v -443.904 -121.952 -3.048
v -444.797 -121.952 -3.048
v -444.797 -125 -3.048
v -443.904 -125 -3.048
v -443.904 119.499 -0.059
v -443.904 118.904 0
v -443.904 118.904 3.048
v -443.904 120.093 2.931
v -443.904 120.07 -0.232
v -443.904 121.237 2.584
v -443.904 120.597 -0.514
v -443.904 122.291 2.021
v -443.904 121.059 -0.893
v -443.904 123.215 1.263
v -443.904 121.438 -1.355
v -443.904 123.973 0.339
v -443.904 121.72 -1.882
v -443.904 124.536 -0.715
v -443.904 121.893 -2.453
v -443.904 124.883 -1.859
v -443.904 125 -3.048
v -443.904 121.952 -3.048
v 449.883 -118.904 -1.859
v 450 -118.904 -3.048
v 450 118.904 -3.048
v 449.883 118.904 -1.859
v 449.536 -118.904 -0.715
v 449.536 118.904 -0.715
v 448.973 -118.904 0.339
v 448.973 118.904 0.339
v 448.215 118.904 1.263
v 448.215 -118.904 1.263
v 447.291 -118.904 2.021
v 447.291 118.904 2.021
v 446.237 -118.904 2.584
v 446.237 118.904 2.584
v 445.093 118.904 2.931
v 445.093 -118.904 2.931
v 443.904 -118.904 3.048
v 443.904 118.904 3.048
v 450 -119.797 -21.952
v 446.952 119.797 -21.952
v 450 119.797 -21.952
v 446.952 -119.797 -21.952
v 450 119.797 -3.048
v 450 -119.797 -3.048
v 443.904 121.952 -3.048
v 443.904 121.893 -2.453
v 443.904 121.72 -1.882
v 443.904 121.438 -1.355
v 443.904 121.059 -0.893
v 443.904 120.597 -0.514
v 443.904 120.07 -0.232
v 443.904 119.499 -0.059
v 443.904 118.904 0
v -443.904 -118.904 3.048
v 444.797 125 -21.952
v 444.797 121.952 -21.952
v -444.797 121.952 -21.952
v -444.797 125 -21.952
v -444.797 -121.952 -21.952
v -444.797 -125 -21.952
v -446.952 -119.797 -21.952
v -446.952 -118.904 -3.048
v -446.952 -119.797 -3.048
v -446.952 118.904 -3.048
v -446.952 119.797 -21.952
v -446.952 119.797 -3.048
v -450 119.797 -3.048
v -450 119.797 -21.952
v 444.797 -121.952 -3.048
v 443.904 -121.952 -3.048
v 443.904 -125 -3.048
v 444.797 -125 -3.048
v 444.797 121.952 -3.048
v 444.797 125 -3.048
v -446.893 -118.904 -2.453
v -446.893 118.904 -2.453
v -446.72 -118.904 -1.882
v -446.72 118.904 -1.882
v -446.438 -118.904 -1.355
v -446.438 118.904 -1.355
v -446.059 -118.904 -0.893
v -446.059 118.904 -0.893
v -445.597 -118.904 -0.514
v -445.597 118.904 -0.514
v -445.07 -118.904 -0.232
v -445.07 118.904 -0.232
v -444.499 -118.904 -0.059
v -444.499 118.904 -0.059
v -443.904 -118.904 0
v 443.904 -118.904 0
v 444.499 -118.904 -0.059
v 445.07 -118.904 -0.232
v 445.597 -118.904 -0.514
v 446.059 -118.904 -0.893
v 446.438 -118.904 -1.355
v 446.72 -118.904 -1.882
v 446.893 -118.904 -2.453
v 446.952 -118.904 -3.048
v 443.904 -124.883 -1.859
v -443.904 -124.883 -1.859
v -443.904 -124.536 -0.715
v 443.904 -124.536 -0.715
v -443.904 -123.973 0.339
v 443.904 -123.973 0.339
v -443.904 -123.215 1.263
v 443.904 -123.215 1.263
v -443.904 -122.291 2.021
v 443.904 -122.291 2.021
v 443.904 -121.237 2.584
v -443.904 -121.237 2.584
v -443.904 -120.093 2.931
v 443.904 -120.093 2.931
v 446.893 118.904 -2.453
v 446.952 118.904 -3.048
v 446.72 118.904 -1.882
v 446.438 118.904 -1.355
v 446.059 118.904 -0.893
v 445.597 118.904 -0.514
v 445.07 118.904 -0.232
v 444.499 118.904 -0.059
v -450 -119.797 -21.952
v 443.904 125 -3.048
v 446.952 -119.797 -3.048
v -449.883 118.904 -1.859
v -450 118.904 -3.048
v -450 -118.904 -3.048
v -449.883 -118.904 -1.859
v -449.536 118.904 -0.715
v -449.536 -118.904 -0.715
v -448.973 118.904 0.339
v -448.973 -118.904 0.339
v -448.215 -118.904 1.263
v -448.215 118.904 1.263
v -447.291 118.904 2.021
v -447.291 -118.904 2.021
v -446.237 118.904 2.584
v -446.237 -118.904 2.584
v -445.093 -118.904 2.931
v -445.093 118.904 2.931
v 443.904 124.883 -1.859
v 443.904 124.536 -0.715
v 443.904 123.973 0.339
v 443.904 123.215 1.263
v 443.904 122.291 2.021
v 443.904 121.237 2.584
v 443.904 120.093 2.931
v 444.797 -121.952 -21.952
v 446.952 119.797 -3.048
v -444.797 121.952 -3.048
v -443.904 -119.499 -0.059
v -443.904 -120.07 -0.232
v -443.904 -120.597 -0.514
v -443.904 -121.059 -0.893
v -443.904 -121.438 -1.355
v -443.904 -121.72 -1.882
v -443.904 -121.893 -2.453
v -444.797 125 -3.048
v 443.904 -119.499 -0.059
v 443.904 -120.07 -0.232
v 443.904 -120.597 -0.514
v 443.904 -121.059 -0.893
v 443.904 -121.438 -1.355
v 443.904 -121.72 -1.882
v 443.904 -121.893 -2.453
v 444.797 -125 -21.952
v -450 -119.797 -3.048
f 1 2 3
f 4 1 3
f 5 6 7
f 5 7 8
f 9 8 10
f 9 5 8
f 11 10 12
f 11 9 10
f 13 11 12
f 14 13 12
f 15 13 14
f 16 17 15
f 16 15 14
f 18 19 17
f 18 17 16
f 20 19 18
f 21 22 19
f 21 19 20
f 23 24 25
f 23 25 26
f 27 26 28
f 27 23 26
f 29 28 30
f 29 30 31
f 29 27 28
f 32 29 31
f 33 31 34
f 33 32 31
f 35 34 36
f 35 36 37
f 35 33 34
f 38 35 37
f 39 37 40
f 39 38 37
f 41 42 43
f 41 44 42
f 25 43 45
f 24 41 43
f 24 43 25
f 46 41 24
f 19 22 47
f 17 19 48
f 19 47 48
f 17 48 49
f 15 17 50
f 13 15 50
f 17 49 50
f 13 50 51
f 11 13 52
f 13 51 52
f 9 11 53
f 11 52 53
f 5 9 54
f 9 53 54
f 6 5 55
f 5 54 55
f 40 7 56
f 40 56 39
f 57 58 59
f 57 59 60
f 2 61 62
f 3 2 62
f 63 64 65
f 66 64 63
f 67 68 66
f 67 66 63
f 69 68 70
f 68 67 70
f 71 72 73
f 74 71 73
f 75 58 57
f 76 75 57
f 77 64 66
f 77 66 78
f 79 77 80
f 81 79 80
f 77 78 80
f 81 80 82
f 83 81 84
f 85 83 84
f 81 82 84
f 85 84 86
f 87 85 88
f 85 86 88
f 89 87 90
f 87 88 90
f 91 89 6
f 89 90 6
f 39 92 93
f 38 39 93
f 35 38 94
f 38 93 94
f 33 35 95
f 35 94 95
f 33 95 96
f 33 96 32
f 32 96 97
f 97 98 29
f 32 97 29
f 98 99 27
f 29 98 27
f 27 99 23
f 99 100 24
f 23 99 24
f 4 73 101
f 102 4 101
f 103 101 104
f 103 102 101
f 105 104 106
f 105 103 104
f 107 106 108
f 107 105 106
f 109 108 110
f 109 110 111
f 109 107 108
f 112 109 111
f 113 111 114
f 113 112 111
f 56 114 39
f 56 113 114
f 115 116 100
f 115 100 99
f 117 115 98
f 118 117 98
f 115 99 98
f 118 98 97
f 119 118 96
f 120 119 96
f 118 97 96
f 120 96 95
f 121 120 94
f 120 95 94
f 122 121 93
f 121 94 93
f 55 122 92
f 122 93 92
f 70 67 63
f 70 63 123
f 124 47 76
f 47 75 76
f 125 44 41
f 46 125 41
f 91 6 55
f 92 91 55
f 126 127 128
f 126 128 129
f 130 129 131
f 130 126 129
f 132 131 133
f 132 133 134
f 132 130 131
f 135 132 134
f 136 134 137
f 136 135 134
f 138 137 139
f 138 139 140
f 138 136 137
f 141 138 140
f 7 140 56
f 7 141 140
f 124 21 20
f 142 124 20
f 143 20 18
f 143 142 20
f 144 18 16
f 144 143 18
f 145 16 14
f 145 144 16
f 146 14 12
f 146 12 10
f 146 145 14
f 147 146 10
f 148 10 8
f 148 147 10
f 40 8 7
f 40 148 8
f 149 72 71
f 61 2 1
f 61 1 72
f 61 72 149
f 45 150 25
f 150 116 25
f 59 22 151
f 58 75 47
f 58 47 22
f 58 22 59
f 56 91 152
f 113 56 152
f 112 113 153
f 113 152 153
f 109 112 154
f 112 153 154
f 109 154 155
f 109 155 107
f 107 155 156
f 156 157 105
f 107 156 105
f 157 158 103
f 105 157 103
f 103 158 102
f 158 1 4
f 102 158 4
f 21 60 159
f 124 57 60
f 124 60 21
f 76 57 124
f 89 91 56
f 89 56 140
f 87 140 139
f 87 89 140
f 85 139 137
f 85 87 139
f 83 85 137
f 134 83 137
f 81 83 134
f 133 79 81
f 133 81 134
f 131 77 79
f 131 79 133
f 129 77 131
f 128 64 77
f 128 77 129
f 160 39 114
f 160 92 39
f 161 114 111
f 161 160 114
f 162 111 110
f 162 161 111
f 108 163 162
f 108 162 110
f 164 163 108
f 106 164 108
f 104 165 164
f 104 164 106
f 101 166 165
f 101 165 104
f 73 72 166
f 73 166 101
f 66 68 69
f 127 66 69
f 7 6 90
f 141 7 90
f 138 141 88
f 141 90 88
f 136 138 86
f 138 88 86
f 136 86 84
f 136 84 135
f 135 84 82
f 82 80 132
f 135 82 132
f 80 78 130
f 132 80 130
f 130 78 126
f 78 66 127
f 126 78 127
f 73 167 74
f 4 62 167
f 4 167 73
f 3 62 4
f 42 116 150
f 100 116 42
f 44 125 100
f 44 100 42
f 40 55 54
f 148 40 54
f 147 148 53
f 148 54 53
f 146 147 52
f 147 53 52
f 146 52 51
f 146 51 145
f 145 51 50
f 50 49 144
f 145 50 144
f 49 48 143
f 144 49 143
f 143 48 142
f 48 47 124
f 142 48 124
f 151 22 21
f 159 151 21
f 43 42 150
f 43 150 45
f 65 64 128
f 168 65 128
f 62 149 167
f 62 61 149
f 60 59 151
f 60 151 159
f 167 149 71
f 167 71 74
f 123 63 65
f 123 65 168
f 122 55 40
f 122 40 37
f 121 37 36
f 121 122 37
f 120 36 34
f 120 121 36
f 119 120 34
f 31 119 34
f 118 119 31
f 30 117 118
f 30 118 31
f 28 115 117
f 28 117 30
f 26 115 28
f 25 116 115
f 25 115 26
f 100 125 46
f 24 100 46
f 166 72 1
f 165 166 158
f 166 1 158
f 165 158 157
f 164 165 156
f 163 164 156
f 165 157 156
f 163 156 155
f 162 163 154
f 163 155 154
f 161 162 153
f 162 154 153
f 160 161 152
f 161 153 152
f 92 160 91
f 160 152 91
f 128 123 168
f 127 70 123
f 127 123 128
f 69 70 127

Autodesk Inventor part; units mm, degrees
ref_plane "YZ Plane" through (0, 0, 0) normal (1, 0, 0) x (0, 1, 0)
ref_plane "XZ Plane" through (0, 0, 0) normal (0, 1, 0) x (-1, 0, 0)
ref_plane "XY Plane" through (0, 0, 0) normal (0, 0, 1) x (1, 0, 0)
sketch "Sketch1" plane through (0, 0, 0) normal (0, 0, 1) x (1, 0, 0)
  point P0 (0, 0)
sketch "Sketch2" plane through (0, 0, 0) normal (0, 0, 1) x (1, 0, 0)
  line L0 (-450, -125) -> (450, -125)
  line L1 (450, -125) -> (450, 125)
  line L2 (450, 125) -> (-450, 125)
  line L3 (-450, 125) -> (-450, -125)
  line L4 (-450, -125) -> (450, 125) construction
  line L5 (450, -125) -> (-450, 125) construction
  point P0 (0, 0)
  dimension "d0" = 900
  dimension "d1" = 250
extrude "Plate1" add sketch "Sketch2" along normal blind 3.048
sketch "Sketch3" plane through (450, 121.952, 3.048) normal (0, 1, 0) x (-1, 0, 0)
  line L0 (900, 0) -> (0, 0)
  line L1 (0, 0) -> (0, -25)
  line L2 (0, -25) -> (900, -25)
  line L3 (900, -25) -> (900, 0)
edge flange "Flange1" height 25 angle 90 thickness 3.048 bend radius 3.048 thickness toward (0, 1, 0) relief tear relief width 3.048 relief depth 1.524 corner gap 3.048 corner form 2 edges at (0, 125, 0) (0, -125, 0) (-450, 0, 0) (450, 0, 0) wall of the first edge with corners at (-450, 121.952, 3.048) (450, 121.952, 3.048) (450, 121.952, -21.952) (-450, 121.952, -21.952)
bend "Bend1"
corner "Corner1"
equation "\"d2\" = Thickness"
equation "\"d3\" = BendReliefWidth"
equation "\"d4\" = BendReliefDepth"
equation "\"d5\" = MinimumRemnant"
equation "\"d6\" = TransitionRadius"
equation "\"d9\" = BendRadius"
equation "\"d10\" = CornerReliefSize"
equation "\"d11\" = GapSize"
equation "\"d12\" = JacobiRadiusSize"
equation "\"BendRadius\" = Thickness"
equation "\"BendReliefWidth\" = Thickness"
equation "\"BendReliefDepth\" = 0.5 * Thickness"
equation "\"CornerReliefSize\" = 4 * Thickness"
equation "\"MinimumRemnant\" = 2 * Thickness"
equation "\"TransitionRadius\" = BendRadius"
equation "\"JacobiRadiusSize\" = BendRadius"
equation "\"GapSize\" = Thickness"
equation "\"Space5\" = 0"
equation "\"Space6\" = 0"
equation "\"Space7\" = 0"
equation "\"Thickness\" = 3.048"
properties part number "TapaUp"
